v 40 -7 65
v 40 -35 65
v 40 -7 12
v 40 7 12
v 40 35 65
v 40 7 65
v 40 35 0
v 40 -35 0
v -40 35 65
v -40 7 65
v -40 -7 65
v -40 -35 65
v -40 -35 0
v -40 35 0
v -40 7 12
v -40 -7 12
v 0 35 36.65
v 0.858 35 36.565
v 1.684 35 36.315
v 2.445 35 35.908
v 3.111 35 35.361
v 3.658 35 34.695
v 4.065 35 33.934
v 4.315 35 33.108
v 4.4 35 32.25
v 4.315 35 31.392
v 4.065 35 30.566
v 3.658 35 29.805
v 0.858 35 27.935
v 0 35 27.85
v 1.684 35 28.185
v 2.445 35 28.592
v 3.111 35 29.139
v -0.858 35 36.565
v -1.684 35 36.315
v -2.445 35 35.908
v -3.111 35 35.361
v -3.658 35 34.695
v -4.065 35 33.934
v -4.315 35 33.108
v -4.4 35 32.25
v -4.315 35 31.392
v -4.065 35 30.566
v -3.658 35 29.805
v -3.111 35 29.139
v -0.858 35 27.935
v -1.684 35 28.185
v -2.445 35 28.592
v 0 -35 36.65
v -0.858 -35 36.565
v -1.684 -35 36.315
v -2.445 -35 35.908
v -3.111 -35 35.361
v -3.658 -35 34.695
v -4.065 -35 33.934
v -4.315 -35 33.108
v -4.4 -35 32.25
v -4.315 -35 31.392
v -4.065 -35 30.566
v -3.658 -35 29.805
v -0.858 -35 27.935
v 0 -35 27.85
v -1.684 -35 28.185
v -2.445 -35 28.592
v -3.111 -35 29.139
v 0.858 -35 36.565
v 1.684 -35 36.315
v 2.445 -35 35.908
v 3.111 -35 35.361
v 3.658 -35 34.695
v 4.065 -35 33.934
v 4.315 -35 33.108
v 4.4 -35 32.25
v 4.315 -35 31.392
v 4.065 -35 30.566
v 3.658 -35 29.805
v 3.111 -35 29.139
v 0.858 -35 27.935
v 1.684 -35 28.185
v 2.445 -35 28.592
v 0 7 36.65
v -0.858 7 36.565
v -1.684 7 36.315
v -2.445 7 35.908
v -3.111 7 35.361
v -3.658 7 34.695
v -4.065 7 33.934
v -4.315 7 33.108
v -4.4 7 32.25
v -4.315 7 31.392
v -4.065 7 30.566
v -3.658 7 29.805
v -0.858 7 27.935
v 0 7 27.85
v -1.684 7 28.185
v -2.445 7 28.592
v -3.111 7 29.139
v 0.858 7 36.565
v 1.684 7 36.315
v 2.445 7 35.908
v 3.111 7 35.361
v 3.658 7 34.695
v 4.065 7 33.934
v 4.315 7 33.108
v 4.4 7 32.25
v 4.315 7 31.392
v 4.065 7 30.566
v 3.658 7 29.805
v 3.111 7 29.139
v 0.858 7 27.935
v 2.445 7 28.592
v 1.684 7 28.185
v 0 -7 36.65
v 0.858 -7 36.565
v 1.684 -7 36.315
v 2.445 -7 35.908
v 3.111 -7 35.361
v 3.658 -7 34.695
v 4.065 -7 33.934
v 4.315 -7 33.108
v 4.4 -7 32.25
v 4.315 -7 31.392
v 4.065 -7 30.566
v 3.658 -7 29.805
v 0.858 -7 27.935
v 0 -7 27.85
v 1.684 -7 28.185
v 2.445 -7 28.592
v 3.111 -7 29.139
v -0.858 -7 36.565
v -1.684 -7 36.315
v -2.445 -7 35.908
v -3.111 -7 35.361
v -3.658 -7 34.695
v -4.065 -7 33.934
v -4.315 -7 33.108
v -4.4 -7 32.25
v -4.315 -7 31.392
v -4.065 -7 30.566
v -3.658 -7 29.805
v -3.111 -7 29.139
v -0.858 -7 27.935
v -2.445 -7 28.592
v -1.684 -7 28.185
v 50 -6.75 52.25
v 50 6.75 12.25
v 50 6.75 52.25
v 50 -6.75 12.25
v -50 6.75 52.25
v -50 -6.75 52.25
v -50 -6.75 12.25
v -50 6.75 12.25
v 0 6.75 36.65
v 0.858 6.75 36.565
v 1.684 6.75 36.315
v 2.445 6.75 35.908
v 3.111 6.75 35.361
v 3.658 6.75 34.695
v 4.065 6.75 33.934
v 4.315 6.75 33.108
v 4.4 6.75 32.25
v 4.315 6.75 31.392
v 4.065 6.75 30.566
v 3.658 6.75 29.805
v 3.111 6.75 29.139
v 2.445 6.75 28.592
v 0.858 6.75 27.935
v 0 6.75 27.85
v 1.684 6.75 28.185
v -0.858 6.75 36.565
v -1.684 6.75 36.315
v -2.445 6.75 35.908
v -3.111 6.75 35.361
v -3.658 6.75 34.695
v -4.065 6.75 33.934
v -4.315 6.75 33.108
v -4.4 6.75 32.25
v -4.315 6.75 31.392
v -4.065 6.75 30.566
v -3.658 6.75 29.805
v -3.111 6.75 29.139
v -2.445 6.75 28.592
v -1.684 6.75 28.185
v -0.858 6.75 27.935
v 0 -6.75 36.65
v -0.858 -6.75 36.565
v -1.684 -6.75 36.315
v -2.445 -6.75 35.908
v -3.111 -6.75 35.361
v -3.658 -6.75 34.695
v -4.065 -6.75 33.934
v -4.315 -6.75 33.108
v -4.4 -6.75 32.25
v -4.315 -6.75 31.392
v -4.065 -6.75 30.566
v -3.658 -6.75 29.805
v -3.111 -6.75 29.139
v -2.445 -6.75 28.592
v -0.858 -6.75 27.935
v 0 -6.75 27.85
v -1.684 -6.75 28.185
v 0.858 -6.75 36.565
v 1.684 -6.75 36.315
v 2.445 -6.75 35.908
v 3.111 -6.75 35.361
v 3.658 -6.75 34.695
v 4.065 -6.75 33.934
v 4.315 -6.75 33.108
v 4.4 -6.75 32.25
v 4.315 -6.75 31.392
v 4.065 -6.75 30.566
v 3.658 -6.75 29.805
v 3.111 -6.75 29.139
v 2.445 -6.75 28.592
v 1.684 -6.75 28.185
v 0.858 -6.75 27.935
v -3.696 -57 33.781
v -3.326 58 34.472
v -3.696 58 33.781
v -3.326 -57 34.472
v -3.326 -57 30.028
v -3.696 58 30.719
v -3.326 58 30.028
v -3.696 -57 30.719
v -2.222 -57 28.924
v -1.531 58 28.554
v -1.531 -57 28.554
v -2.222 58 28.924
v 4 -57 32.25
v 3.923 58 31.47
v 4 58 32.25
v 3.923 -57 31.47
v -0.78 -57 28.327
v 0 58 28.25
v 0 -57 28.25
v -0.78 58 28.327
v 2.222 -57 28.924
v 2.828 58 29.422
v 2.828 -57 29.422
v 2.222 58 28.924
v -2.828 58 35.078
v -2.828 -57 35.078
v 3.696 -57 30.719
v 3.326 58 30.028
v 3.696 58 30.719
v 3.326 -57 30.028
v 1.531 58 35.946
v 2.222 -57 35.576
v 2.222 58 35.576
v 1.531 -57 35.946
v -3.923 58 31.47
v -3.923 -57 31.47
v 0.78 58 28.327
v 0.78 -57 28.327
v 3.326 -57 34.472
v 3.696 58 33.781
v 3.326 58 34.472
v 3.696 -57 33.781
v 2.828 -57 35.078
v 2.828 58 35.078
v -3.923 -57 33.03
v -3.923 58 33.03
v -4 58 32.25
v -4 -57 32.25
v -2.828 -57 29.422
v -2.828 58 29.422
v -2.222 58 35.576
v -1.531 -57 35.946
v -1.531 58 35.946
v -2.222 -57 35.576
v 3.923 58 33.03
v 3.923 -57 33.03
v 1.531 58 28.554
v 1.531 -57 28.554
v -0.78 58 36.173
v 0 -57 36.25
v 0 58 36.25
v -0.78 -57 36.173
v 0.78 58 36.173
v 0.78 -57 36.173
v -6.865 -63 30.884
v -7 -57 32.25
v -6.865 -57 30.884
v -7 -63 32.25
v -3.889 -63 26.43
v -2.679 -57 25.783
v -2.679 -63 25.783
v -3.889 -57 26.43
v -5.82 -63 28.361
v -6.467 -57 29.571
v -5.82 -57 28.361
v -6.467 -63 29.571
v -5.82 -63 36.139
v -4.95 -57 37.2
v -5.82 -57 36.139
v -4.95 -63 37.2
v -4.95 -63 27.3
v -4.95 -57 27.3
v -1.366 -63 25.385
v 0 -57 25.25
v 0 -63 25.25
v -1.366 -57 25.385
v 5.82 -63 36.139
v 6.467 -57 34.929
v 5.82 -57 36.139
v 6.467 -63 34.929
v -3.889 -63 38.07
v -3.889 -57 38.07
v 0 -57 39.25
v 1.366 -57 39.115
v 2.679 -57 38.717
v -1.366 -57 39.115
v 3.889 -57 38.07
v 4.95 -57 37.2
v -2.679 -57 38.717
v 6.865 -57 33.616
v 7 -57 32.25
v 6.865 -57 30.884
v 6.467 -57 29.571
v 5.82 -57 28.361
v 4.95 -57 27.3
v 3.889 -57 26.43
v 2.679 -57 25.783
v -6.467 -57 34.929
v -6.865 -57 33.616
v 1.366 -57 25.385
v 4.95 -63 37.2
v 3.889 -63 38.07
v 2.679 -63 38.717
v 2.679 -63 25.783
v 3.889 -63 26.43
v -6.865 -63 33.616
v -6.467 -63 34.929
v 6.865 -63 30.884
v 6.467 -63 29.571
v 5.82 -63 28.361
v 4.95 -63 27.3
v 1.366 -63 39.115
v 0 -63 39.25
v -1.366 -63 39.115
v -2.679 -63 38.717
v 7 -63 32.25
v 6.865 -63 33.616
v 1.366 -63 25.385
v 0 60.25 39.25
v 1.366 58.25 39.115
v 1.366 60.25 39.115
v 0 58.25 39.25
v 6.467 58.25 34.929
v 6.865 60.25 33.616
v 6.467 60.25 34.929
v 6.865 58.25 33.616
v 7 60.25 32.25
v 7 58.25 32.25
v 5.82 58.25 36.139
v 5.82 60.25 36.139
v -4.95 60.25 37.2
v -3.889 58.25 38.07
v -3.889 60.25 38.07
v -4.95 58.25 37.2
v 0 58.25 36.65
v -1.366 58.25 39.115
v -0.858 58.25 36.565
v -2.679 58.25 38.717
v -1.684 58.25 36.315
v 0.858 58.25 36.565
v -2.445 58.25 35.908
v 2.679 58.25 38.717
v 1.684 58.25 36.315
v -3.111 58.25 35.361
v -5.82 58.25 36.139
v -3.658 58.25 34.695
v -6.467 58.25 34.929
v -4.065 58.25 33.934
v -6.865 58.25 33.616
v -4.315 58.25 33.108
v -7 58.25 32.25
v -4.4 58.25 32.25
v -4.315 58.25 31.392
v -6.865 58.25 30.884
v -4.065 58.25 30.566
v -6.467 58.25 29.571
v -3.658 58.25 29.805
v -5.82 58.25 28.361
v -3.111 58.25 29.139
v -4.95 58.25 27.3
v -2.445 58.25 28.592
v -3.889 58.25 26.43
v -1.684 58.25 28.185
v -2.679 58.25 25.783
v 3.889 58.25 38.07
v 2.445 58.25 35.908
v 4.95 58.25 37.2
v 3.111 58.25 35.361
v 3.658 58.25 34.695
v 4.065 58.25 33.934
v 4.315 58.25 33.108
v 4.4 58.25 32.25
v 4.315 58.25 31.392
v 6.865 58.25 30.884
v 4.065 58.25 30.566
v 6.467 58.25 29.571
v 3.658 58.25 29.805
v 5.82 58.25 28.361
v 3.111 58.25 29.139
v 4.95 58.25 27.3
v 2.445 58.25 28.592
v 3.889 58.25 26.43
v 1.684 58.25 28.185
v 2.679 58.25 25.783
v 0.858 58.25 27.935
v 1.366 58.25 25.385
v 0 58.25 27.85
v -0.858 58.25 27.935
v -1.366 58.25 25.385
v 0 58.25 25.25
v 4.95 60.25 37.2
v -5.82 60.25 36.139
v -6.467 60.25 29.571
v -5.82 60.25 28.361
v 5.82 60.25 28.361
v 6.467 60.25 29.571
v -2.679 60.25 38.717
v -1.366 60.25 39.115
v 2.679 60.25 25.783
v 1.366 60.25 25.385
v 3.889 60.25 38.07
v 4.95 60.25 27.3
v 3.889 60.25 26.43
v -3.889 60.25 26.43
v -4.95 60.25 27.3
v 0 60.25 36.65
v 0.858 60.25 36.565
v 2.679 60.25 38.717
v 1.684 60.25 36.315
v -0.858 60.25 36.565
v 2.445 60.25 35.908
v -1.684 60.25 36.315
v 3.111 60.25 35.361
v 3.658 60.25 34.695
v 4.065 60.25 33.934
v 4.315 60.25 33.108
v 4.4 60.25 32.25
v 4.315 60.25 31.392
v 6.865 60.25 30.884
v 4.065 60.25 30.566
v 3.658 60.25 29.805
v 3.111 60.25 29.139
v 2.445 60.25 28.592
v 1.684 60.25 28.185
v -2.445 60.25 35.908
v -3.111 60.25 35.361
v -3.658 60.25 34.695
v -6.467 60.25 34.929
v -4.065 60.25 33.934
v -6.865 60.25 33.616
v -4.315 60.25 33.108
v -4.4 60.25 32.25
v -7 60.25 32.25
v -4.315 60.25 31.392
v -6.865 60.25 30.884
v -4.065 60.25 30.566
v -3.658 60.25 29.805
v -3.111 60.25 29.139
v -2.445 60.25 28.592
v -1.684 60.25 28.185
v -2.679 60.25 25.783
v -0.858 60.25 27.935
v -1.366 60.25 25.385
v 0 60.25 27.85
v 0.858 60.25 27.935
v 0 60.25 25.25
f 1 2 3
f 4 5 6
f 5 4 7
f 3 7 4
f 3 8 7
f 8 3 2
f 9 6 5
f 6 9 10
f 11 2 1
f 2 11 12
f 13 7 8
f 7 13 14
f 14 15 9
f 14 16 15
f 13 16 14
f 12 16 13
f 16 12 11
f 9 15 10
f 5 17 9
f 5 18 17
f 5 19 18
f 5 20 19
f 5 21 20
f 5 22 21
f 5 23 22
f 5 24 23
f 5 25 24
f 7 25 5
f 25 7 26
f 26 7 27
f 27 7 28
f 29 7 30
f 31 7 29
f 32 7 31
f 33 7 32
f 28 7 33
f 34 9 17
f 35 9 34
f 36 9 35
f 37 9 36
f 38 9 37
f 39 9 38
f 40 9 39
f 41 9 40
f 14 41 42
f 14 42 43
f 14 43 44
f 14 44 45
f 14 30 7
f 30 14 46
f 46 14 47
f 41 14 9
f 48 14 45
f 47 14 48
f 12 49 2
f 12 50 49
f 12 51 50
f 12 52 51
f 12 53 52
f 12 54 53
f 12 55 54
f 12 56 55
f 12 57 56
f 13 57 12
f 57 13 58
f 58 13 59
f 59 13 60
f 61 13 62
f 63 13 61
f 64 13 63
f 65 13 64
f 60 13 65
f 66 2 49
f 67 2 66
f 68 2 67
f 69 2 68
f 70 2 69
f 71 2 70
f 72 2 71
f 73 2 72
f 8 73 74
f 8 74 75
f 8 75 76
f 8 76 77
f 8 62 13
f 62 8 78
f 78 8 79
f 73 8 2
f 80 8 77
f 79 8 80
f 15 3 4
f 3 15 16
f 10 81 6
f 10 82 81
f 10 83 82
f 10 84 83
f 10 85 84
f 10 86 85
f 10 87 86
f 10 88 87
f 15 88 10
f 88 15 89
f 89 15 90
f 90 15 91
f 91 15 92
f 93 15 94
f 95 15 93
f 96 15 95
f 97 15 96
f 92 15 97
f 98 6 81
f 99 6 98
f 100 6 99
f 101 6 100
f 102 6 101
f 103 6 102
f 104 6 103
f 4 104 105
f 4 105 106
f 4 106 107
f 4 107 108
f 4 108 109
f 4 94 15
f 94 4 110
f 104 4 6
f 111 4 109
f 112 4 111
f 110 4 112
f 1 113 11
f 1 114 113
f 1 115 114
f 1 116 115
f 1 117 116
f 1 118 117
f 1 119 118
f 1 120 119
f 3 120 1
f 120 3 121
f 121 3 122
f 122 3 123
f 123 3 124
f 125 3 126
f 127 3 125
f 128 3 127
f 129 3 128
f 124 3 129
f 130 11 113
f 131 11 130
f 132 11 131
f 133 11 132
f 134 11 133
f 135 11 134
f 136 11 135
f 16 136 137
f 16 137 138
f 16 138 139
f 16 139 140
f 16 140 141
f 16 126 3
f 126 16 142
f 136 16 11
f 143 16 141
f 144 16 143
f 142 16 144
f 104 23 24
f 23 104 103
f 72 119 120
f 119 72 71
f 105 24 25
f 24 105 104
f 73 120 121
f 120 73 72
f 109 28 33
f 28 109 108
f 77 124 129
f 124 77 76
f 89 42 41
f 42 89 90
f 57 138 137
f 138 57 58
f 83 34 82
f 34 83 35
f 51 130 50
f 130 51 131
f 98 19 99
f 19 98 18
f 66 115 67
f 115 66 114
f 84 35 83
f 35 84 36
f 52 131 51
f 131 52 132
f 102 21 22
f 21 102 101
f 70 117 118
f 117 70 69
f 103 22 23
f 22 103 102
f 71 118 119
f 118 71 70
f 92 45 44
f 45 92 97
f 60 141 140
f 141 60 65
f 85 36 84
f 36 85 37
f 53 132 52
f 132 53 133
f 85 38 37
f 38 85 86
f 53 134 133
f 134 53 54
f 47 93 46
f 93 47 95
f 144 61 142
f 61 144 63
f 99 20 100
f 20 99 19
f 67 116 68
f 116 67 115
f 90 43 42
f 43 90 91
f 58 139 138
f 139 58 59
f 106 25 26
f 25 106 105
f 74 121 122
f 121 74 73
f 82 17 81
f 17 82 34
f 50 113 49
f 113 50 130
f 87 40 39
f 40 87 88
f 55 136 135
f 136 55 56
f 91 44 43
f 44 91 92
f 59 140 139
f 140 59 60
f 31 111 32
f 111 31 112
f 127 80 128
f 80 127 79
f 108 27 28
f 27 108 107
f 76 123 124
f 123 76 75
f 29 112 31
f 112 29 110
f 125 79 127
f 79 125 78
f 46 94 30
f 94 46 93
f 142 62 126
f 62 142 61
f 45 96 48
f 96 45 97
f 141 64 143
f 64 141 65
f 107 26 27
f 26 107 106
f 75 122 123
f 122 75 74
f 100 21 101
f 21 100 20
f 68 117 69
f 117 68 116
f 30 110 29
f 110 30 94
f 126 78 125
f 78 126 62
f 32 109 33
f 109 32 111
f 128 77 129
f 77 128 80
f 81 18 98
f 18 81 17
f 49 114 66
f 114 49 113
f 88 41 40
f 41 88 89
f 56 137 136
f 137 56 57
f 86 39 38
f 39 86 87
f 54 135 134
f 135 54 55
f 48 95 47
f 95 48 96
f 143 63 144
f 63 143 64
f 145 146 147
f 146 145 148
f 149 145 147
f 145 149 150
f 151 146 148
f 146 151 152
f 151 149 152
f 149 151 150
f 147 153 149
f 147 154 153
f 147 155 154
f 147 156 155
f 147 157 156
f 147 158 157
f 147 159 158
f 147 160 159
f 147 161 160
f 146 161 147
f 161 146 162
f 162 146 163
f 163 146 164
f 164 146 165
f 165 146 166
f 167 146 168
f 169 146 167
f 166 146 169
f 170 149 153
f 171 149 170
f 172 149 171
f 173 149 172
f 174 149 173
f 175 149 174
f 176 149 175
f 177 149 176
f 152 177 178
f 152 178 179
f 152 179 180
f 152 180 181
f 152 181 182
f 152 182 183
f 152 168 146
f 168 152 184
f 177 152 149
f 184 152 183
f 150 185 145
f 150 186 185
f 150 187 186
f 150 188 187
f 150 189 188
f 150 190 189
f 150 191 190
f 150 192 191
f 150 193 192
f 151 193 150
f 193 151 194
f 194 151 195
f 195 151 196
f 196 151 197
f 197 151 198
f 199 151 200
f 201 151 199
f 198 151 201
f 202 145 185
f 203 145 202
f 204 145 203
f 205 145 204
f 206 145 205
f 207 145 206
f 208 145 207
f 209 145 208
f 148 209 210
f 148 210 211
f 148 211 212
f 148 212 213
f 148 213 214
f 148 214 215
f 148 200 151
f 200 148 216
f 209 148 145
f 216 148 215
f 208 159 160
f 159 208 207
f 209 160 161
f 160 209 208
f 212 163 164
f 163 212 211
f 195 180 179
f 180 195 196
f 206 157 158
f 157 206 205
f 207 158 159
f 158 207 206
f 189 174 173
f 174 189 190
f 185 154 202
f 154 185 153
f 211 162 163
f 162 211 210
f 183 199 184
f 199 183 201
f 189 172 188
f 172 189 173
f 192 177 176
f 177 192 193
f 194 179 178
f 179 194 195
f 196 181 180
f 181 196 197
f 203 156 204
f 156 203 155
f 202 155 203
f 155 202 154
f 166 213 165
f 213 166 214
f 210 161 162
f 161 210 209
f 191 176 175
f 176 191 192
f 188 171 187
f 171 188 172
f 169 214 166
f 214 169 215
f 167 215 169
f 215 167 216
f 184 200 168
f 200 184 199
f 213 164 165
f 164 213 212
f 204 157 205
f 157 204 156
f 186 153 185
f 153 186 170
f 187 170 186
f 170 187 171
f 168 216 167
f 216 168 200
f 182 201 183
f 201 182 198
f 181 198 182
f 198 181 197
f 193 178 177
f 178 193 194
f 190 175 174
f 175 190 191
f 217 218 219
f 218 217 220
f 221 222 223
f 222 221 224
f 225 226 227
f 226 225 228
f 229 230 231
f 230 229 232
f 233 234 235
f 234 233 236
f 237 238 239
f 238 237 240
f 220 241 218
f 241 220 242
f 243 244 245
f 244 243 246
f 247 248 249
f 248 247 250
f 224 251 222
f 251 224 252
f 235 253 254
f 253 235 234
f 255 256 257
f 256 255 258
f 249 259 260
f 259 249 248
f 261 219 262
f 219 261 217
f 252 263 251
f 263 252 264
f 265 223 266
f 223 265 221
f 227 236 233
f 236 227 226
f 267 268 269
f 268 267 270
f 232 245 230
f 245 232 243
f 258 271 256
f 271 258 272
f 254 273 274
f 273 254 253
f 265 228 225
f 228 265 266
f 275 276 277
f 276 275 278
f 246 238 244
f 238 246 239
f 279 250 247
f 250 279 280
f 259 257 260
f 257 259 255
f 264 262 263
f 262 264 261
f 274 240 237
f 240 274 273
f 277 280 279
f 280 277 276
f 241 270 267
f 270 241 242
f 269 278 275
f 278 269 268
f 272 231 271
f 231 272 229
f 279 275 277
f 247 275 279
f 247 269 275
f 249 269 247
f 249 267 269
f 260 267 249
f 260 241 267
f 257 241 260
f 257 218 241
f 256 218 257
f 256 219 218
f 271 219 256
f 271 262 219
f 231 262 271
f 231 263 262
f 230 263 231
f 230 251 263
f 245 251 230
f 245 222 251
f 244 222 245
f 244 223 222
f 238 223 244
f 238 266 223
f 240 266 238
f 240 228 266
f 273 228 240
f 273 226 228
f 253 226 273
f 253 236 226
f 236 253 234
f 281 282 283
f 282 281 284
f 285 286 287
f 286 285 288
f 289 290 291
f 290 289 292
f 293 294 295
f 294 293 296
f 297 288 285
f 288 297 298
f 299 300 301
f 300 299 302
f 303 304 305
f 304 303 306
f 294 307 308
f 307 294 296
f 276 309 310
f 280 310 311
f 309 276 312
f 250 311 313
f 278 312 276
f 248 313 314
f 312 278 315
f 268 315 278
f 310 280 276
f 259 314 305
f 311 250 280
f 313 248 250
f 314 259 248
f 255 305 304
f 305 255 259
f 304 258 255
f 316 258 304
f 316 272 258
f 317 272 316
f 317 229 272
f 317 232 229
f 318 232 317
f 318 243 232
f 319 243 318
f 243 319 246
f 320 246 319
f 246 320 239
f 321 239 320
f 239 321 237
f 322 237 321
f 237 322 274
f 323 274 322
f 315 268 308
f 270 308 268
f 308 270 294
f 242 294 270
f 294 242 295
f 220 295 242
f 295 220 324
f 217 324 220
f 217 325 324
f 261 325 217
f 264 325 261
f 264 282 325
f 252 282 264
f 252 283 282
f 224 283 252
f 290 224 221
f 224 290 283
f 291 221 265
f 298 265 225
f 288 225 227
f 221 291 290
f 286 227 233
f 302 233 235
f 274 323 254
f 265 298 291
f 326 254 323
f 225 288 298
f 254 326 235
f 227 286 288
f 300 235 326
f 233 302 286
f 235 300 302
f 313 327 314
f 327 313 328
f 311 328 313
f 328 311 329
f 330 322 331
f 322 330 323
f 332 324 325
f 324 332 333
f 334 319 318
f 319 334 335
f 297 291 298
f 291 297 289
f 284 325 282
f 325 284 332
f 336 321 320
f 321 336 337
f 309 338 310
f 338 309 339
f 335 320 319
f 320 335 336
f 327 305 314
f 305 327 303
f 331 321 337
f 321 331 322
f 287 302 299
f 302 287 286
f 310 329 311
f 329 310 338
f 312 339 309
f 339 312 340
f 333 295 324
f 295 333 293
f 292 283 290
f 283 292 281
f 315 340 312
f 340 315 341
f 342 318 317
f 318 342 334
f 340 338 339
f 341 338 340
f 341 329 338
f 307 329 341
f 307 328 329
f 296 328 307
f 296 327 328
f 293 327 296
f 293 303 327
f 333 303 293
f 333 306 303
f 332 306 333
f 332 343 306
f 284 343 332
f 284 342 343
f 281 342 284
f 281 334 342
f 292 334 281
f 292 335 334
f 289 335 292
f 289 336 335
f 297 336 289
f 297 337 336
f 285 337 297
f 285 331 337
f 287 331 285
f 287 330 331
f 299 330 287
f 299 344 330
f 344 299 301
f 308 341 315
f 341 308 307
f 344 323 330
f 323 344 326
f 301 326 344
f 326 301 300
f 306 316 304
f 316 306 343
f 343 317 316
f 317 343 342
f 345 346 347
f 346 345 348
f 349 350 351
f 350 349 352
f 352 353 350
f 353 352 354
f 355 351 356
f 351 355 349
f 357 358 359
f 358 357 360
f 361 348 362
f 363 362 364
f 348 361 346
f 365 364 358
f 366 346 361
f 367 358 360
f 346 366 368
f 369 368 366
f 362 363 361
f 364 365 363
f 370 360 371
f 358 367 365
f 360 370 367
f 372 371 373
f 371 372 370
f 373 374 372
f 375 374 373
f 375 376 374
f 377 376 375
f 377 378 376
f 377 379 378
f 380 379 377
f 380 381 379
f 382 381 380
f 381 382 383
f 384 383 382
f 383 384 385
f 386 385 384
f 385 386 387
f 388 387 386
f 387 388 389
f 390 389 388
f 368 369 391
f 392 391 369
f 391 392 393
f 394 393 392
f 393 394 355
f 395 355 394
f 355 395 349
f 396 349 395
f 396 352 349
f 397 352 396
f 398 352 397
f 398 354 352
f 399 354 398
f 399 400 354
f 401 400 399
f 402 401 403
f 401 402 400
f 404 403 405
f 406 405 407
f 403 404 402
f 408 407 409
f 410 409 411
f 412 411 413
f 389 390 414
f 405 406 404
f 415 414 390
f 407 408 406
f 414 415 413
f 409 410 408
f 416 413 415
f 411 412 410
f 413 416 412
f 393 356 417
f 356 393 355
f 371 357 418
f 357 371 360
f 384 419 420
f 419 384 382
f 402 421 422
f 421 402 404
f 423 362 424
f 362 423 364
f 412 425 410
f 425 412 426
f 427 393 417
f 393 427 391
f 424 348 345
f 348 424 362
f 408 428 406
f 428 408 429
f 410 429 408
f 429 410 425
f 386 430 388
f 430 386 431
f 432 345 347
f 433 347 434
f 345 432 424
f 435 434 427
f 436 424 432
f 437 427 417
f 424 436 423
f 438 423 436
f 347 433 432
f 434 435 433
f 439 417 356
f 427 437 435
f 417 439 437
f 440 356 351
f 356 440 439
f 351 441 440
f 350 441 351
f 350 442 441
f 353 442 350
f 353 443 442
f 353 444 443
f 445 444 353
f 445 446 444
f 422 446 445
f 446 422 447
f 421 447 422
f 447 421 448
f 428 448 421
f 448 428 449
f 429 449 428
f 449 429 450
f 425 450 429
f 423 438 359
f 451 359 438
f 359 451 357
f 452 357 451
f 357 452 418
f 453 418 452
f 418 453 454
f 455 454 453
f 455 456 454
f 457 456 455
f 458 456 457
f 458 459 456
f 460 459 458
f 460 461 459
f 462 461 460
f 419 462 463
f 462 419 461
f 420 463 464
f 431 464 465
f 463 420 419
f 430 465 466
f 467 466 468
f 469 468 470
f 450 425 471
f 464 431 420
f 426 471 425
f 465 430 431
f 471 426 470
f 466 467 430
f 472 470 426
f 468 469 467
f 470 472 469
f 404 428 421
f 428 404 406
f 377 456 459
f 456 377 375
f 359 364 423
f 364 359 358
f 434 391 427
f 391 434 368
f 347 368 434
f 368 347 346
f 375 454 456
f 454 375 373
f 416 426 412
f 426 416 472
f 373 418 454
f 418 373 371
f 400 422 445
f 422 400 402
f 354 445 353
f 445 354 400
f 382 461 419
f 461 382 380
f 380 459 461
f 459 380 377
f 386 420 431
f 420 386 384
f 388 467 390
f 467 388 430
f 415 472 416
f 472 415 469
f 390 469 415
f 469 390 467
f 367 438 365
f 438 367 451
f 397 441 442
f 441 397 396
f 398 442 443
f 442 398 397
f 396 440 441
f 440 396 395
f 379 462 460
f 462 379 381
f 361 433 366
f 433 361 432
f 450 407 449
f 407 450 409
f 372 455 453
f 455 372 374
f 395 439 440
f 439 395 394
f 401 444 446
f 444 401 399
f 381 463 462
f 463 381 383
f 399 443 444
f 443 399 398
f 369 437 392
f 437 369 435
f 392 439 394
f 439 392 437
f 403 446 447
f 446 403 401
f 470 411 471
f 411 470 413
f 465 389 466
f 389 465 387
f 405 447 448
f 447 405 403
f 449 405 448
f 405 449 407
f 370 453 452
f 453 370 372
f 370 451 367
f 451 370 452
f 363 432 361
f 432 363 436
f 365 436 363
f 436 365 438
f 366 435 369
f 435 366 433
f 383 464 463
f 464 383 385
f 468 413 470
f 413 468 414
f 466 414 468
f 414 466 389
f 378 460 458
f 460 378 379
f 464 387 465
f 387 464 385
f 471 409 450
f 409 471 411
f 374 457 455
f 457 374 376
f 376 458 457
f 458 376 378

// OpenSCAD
$fn = 32;

// ------------------------------------------------------------------------
// Clevis joint: 80 mm clevis, pin d8
// Every part is its own module, assembly() places them once.
// ------------------------------------------------------------------------

// --- part 1 ---
module clevis() {
  difference() {
    translate([-40, -35, 0]) cube([80, 70, 65]);
    translate([-41, -7, 12]) cube([82, 14, 54]);
    translate([0, 0, 32.25]) rotate([90, 0, 0]) cylinder(h = 72, d = 8.8, center = true);
  }
}

// --- part 2 ---
module eye() {
  difference() {
    translate([-50, -6.75, 0]) cube([100, 13.5, 40]);
    translate([0, 0, 20]) rotate([90, 0, 0]) cylinder(h = 15.5, d = 8.8, center = true);
  }
}

// --- part 3 ---
module pin() {
  rotate([0, 90, 0]) cylinder(h = 116, d = 8, center = true);
  translate([-63, 0, 0]) rotate([0, 90, 0]) cylinder(h = 6, d = 14);
}

// --- part 4 ---
module retainer() {
  difference() {
      translate([0, 0, 0]) cylinder(h = 2, d = 14);
      translate([0, 0, -1]) cylinder(h = 4, d = 8.8);
    }
}

// --- assembly ---
module assembly() {
  translate([0, 0, 0]) rotate([0, 0, 0]) clevis();
  translate([0, 0, 12.25]) rotate([0, 0, 0]) eye();
  translate([0, 0, 32.25]) rotate([0, 0, 90]) pin();
  translate([0, 60.25, 32.25]) rotate([90, 0, 0]) retainer();
}

assembly();
